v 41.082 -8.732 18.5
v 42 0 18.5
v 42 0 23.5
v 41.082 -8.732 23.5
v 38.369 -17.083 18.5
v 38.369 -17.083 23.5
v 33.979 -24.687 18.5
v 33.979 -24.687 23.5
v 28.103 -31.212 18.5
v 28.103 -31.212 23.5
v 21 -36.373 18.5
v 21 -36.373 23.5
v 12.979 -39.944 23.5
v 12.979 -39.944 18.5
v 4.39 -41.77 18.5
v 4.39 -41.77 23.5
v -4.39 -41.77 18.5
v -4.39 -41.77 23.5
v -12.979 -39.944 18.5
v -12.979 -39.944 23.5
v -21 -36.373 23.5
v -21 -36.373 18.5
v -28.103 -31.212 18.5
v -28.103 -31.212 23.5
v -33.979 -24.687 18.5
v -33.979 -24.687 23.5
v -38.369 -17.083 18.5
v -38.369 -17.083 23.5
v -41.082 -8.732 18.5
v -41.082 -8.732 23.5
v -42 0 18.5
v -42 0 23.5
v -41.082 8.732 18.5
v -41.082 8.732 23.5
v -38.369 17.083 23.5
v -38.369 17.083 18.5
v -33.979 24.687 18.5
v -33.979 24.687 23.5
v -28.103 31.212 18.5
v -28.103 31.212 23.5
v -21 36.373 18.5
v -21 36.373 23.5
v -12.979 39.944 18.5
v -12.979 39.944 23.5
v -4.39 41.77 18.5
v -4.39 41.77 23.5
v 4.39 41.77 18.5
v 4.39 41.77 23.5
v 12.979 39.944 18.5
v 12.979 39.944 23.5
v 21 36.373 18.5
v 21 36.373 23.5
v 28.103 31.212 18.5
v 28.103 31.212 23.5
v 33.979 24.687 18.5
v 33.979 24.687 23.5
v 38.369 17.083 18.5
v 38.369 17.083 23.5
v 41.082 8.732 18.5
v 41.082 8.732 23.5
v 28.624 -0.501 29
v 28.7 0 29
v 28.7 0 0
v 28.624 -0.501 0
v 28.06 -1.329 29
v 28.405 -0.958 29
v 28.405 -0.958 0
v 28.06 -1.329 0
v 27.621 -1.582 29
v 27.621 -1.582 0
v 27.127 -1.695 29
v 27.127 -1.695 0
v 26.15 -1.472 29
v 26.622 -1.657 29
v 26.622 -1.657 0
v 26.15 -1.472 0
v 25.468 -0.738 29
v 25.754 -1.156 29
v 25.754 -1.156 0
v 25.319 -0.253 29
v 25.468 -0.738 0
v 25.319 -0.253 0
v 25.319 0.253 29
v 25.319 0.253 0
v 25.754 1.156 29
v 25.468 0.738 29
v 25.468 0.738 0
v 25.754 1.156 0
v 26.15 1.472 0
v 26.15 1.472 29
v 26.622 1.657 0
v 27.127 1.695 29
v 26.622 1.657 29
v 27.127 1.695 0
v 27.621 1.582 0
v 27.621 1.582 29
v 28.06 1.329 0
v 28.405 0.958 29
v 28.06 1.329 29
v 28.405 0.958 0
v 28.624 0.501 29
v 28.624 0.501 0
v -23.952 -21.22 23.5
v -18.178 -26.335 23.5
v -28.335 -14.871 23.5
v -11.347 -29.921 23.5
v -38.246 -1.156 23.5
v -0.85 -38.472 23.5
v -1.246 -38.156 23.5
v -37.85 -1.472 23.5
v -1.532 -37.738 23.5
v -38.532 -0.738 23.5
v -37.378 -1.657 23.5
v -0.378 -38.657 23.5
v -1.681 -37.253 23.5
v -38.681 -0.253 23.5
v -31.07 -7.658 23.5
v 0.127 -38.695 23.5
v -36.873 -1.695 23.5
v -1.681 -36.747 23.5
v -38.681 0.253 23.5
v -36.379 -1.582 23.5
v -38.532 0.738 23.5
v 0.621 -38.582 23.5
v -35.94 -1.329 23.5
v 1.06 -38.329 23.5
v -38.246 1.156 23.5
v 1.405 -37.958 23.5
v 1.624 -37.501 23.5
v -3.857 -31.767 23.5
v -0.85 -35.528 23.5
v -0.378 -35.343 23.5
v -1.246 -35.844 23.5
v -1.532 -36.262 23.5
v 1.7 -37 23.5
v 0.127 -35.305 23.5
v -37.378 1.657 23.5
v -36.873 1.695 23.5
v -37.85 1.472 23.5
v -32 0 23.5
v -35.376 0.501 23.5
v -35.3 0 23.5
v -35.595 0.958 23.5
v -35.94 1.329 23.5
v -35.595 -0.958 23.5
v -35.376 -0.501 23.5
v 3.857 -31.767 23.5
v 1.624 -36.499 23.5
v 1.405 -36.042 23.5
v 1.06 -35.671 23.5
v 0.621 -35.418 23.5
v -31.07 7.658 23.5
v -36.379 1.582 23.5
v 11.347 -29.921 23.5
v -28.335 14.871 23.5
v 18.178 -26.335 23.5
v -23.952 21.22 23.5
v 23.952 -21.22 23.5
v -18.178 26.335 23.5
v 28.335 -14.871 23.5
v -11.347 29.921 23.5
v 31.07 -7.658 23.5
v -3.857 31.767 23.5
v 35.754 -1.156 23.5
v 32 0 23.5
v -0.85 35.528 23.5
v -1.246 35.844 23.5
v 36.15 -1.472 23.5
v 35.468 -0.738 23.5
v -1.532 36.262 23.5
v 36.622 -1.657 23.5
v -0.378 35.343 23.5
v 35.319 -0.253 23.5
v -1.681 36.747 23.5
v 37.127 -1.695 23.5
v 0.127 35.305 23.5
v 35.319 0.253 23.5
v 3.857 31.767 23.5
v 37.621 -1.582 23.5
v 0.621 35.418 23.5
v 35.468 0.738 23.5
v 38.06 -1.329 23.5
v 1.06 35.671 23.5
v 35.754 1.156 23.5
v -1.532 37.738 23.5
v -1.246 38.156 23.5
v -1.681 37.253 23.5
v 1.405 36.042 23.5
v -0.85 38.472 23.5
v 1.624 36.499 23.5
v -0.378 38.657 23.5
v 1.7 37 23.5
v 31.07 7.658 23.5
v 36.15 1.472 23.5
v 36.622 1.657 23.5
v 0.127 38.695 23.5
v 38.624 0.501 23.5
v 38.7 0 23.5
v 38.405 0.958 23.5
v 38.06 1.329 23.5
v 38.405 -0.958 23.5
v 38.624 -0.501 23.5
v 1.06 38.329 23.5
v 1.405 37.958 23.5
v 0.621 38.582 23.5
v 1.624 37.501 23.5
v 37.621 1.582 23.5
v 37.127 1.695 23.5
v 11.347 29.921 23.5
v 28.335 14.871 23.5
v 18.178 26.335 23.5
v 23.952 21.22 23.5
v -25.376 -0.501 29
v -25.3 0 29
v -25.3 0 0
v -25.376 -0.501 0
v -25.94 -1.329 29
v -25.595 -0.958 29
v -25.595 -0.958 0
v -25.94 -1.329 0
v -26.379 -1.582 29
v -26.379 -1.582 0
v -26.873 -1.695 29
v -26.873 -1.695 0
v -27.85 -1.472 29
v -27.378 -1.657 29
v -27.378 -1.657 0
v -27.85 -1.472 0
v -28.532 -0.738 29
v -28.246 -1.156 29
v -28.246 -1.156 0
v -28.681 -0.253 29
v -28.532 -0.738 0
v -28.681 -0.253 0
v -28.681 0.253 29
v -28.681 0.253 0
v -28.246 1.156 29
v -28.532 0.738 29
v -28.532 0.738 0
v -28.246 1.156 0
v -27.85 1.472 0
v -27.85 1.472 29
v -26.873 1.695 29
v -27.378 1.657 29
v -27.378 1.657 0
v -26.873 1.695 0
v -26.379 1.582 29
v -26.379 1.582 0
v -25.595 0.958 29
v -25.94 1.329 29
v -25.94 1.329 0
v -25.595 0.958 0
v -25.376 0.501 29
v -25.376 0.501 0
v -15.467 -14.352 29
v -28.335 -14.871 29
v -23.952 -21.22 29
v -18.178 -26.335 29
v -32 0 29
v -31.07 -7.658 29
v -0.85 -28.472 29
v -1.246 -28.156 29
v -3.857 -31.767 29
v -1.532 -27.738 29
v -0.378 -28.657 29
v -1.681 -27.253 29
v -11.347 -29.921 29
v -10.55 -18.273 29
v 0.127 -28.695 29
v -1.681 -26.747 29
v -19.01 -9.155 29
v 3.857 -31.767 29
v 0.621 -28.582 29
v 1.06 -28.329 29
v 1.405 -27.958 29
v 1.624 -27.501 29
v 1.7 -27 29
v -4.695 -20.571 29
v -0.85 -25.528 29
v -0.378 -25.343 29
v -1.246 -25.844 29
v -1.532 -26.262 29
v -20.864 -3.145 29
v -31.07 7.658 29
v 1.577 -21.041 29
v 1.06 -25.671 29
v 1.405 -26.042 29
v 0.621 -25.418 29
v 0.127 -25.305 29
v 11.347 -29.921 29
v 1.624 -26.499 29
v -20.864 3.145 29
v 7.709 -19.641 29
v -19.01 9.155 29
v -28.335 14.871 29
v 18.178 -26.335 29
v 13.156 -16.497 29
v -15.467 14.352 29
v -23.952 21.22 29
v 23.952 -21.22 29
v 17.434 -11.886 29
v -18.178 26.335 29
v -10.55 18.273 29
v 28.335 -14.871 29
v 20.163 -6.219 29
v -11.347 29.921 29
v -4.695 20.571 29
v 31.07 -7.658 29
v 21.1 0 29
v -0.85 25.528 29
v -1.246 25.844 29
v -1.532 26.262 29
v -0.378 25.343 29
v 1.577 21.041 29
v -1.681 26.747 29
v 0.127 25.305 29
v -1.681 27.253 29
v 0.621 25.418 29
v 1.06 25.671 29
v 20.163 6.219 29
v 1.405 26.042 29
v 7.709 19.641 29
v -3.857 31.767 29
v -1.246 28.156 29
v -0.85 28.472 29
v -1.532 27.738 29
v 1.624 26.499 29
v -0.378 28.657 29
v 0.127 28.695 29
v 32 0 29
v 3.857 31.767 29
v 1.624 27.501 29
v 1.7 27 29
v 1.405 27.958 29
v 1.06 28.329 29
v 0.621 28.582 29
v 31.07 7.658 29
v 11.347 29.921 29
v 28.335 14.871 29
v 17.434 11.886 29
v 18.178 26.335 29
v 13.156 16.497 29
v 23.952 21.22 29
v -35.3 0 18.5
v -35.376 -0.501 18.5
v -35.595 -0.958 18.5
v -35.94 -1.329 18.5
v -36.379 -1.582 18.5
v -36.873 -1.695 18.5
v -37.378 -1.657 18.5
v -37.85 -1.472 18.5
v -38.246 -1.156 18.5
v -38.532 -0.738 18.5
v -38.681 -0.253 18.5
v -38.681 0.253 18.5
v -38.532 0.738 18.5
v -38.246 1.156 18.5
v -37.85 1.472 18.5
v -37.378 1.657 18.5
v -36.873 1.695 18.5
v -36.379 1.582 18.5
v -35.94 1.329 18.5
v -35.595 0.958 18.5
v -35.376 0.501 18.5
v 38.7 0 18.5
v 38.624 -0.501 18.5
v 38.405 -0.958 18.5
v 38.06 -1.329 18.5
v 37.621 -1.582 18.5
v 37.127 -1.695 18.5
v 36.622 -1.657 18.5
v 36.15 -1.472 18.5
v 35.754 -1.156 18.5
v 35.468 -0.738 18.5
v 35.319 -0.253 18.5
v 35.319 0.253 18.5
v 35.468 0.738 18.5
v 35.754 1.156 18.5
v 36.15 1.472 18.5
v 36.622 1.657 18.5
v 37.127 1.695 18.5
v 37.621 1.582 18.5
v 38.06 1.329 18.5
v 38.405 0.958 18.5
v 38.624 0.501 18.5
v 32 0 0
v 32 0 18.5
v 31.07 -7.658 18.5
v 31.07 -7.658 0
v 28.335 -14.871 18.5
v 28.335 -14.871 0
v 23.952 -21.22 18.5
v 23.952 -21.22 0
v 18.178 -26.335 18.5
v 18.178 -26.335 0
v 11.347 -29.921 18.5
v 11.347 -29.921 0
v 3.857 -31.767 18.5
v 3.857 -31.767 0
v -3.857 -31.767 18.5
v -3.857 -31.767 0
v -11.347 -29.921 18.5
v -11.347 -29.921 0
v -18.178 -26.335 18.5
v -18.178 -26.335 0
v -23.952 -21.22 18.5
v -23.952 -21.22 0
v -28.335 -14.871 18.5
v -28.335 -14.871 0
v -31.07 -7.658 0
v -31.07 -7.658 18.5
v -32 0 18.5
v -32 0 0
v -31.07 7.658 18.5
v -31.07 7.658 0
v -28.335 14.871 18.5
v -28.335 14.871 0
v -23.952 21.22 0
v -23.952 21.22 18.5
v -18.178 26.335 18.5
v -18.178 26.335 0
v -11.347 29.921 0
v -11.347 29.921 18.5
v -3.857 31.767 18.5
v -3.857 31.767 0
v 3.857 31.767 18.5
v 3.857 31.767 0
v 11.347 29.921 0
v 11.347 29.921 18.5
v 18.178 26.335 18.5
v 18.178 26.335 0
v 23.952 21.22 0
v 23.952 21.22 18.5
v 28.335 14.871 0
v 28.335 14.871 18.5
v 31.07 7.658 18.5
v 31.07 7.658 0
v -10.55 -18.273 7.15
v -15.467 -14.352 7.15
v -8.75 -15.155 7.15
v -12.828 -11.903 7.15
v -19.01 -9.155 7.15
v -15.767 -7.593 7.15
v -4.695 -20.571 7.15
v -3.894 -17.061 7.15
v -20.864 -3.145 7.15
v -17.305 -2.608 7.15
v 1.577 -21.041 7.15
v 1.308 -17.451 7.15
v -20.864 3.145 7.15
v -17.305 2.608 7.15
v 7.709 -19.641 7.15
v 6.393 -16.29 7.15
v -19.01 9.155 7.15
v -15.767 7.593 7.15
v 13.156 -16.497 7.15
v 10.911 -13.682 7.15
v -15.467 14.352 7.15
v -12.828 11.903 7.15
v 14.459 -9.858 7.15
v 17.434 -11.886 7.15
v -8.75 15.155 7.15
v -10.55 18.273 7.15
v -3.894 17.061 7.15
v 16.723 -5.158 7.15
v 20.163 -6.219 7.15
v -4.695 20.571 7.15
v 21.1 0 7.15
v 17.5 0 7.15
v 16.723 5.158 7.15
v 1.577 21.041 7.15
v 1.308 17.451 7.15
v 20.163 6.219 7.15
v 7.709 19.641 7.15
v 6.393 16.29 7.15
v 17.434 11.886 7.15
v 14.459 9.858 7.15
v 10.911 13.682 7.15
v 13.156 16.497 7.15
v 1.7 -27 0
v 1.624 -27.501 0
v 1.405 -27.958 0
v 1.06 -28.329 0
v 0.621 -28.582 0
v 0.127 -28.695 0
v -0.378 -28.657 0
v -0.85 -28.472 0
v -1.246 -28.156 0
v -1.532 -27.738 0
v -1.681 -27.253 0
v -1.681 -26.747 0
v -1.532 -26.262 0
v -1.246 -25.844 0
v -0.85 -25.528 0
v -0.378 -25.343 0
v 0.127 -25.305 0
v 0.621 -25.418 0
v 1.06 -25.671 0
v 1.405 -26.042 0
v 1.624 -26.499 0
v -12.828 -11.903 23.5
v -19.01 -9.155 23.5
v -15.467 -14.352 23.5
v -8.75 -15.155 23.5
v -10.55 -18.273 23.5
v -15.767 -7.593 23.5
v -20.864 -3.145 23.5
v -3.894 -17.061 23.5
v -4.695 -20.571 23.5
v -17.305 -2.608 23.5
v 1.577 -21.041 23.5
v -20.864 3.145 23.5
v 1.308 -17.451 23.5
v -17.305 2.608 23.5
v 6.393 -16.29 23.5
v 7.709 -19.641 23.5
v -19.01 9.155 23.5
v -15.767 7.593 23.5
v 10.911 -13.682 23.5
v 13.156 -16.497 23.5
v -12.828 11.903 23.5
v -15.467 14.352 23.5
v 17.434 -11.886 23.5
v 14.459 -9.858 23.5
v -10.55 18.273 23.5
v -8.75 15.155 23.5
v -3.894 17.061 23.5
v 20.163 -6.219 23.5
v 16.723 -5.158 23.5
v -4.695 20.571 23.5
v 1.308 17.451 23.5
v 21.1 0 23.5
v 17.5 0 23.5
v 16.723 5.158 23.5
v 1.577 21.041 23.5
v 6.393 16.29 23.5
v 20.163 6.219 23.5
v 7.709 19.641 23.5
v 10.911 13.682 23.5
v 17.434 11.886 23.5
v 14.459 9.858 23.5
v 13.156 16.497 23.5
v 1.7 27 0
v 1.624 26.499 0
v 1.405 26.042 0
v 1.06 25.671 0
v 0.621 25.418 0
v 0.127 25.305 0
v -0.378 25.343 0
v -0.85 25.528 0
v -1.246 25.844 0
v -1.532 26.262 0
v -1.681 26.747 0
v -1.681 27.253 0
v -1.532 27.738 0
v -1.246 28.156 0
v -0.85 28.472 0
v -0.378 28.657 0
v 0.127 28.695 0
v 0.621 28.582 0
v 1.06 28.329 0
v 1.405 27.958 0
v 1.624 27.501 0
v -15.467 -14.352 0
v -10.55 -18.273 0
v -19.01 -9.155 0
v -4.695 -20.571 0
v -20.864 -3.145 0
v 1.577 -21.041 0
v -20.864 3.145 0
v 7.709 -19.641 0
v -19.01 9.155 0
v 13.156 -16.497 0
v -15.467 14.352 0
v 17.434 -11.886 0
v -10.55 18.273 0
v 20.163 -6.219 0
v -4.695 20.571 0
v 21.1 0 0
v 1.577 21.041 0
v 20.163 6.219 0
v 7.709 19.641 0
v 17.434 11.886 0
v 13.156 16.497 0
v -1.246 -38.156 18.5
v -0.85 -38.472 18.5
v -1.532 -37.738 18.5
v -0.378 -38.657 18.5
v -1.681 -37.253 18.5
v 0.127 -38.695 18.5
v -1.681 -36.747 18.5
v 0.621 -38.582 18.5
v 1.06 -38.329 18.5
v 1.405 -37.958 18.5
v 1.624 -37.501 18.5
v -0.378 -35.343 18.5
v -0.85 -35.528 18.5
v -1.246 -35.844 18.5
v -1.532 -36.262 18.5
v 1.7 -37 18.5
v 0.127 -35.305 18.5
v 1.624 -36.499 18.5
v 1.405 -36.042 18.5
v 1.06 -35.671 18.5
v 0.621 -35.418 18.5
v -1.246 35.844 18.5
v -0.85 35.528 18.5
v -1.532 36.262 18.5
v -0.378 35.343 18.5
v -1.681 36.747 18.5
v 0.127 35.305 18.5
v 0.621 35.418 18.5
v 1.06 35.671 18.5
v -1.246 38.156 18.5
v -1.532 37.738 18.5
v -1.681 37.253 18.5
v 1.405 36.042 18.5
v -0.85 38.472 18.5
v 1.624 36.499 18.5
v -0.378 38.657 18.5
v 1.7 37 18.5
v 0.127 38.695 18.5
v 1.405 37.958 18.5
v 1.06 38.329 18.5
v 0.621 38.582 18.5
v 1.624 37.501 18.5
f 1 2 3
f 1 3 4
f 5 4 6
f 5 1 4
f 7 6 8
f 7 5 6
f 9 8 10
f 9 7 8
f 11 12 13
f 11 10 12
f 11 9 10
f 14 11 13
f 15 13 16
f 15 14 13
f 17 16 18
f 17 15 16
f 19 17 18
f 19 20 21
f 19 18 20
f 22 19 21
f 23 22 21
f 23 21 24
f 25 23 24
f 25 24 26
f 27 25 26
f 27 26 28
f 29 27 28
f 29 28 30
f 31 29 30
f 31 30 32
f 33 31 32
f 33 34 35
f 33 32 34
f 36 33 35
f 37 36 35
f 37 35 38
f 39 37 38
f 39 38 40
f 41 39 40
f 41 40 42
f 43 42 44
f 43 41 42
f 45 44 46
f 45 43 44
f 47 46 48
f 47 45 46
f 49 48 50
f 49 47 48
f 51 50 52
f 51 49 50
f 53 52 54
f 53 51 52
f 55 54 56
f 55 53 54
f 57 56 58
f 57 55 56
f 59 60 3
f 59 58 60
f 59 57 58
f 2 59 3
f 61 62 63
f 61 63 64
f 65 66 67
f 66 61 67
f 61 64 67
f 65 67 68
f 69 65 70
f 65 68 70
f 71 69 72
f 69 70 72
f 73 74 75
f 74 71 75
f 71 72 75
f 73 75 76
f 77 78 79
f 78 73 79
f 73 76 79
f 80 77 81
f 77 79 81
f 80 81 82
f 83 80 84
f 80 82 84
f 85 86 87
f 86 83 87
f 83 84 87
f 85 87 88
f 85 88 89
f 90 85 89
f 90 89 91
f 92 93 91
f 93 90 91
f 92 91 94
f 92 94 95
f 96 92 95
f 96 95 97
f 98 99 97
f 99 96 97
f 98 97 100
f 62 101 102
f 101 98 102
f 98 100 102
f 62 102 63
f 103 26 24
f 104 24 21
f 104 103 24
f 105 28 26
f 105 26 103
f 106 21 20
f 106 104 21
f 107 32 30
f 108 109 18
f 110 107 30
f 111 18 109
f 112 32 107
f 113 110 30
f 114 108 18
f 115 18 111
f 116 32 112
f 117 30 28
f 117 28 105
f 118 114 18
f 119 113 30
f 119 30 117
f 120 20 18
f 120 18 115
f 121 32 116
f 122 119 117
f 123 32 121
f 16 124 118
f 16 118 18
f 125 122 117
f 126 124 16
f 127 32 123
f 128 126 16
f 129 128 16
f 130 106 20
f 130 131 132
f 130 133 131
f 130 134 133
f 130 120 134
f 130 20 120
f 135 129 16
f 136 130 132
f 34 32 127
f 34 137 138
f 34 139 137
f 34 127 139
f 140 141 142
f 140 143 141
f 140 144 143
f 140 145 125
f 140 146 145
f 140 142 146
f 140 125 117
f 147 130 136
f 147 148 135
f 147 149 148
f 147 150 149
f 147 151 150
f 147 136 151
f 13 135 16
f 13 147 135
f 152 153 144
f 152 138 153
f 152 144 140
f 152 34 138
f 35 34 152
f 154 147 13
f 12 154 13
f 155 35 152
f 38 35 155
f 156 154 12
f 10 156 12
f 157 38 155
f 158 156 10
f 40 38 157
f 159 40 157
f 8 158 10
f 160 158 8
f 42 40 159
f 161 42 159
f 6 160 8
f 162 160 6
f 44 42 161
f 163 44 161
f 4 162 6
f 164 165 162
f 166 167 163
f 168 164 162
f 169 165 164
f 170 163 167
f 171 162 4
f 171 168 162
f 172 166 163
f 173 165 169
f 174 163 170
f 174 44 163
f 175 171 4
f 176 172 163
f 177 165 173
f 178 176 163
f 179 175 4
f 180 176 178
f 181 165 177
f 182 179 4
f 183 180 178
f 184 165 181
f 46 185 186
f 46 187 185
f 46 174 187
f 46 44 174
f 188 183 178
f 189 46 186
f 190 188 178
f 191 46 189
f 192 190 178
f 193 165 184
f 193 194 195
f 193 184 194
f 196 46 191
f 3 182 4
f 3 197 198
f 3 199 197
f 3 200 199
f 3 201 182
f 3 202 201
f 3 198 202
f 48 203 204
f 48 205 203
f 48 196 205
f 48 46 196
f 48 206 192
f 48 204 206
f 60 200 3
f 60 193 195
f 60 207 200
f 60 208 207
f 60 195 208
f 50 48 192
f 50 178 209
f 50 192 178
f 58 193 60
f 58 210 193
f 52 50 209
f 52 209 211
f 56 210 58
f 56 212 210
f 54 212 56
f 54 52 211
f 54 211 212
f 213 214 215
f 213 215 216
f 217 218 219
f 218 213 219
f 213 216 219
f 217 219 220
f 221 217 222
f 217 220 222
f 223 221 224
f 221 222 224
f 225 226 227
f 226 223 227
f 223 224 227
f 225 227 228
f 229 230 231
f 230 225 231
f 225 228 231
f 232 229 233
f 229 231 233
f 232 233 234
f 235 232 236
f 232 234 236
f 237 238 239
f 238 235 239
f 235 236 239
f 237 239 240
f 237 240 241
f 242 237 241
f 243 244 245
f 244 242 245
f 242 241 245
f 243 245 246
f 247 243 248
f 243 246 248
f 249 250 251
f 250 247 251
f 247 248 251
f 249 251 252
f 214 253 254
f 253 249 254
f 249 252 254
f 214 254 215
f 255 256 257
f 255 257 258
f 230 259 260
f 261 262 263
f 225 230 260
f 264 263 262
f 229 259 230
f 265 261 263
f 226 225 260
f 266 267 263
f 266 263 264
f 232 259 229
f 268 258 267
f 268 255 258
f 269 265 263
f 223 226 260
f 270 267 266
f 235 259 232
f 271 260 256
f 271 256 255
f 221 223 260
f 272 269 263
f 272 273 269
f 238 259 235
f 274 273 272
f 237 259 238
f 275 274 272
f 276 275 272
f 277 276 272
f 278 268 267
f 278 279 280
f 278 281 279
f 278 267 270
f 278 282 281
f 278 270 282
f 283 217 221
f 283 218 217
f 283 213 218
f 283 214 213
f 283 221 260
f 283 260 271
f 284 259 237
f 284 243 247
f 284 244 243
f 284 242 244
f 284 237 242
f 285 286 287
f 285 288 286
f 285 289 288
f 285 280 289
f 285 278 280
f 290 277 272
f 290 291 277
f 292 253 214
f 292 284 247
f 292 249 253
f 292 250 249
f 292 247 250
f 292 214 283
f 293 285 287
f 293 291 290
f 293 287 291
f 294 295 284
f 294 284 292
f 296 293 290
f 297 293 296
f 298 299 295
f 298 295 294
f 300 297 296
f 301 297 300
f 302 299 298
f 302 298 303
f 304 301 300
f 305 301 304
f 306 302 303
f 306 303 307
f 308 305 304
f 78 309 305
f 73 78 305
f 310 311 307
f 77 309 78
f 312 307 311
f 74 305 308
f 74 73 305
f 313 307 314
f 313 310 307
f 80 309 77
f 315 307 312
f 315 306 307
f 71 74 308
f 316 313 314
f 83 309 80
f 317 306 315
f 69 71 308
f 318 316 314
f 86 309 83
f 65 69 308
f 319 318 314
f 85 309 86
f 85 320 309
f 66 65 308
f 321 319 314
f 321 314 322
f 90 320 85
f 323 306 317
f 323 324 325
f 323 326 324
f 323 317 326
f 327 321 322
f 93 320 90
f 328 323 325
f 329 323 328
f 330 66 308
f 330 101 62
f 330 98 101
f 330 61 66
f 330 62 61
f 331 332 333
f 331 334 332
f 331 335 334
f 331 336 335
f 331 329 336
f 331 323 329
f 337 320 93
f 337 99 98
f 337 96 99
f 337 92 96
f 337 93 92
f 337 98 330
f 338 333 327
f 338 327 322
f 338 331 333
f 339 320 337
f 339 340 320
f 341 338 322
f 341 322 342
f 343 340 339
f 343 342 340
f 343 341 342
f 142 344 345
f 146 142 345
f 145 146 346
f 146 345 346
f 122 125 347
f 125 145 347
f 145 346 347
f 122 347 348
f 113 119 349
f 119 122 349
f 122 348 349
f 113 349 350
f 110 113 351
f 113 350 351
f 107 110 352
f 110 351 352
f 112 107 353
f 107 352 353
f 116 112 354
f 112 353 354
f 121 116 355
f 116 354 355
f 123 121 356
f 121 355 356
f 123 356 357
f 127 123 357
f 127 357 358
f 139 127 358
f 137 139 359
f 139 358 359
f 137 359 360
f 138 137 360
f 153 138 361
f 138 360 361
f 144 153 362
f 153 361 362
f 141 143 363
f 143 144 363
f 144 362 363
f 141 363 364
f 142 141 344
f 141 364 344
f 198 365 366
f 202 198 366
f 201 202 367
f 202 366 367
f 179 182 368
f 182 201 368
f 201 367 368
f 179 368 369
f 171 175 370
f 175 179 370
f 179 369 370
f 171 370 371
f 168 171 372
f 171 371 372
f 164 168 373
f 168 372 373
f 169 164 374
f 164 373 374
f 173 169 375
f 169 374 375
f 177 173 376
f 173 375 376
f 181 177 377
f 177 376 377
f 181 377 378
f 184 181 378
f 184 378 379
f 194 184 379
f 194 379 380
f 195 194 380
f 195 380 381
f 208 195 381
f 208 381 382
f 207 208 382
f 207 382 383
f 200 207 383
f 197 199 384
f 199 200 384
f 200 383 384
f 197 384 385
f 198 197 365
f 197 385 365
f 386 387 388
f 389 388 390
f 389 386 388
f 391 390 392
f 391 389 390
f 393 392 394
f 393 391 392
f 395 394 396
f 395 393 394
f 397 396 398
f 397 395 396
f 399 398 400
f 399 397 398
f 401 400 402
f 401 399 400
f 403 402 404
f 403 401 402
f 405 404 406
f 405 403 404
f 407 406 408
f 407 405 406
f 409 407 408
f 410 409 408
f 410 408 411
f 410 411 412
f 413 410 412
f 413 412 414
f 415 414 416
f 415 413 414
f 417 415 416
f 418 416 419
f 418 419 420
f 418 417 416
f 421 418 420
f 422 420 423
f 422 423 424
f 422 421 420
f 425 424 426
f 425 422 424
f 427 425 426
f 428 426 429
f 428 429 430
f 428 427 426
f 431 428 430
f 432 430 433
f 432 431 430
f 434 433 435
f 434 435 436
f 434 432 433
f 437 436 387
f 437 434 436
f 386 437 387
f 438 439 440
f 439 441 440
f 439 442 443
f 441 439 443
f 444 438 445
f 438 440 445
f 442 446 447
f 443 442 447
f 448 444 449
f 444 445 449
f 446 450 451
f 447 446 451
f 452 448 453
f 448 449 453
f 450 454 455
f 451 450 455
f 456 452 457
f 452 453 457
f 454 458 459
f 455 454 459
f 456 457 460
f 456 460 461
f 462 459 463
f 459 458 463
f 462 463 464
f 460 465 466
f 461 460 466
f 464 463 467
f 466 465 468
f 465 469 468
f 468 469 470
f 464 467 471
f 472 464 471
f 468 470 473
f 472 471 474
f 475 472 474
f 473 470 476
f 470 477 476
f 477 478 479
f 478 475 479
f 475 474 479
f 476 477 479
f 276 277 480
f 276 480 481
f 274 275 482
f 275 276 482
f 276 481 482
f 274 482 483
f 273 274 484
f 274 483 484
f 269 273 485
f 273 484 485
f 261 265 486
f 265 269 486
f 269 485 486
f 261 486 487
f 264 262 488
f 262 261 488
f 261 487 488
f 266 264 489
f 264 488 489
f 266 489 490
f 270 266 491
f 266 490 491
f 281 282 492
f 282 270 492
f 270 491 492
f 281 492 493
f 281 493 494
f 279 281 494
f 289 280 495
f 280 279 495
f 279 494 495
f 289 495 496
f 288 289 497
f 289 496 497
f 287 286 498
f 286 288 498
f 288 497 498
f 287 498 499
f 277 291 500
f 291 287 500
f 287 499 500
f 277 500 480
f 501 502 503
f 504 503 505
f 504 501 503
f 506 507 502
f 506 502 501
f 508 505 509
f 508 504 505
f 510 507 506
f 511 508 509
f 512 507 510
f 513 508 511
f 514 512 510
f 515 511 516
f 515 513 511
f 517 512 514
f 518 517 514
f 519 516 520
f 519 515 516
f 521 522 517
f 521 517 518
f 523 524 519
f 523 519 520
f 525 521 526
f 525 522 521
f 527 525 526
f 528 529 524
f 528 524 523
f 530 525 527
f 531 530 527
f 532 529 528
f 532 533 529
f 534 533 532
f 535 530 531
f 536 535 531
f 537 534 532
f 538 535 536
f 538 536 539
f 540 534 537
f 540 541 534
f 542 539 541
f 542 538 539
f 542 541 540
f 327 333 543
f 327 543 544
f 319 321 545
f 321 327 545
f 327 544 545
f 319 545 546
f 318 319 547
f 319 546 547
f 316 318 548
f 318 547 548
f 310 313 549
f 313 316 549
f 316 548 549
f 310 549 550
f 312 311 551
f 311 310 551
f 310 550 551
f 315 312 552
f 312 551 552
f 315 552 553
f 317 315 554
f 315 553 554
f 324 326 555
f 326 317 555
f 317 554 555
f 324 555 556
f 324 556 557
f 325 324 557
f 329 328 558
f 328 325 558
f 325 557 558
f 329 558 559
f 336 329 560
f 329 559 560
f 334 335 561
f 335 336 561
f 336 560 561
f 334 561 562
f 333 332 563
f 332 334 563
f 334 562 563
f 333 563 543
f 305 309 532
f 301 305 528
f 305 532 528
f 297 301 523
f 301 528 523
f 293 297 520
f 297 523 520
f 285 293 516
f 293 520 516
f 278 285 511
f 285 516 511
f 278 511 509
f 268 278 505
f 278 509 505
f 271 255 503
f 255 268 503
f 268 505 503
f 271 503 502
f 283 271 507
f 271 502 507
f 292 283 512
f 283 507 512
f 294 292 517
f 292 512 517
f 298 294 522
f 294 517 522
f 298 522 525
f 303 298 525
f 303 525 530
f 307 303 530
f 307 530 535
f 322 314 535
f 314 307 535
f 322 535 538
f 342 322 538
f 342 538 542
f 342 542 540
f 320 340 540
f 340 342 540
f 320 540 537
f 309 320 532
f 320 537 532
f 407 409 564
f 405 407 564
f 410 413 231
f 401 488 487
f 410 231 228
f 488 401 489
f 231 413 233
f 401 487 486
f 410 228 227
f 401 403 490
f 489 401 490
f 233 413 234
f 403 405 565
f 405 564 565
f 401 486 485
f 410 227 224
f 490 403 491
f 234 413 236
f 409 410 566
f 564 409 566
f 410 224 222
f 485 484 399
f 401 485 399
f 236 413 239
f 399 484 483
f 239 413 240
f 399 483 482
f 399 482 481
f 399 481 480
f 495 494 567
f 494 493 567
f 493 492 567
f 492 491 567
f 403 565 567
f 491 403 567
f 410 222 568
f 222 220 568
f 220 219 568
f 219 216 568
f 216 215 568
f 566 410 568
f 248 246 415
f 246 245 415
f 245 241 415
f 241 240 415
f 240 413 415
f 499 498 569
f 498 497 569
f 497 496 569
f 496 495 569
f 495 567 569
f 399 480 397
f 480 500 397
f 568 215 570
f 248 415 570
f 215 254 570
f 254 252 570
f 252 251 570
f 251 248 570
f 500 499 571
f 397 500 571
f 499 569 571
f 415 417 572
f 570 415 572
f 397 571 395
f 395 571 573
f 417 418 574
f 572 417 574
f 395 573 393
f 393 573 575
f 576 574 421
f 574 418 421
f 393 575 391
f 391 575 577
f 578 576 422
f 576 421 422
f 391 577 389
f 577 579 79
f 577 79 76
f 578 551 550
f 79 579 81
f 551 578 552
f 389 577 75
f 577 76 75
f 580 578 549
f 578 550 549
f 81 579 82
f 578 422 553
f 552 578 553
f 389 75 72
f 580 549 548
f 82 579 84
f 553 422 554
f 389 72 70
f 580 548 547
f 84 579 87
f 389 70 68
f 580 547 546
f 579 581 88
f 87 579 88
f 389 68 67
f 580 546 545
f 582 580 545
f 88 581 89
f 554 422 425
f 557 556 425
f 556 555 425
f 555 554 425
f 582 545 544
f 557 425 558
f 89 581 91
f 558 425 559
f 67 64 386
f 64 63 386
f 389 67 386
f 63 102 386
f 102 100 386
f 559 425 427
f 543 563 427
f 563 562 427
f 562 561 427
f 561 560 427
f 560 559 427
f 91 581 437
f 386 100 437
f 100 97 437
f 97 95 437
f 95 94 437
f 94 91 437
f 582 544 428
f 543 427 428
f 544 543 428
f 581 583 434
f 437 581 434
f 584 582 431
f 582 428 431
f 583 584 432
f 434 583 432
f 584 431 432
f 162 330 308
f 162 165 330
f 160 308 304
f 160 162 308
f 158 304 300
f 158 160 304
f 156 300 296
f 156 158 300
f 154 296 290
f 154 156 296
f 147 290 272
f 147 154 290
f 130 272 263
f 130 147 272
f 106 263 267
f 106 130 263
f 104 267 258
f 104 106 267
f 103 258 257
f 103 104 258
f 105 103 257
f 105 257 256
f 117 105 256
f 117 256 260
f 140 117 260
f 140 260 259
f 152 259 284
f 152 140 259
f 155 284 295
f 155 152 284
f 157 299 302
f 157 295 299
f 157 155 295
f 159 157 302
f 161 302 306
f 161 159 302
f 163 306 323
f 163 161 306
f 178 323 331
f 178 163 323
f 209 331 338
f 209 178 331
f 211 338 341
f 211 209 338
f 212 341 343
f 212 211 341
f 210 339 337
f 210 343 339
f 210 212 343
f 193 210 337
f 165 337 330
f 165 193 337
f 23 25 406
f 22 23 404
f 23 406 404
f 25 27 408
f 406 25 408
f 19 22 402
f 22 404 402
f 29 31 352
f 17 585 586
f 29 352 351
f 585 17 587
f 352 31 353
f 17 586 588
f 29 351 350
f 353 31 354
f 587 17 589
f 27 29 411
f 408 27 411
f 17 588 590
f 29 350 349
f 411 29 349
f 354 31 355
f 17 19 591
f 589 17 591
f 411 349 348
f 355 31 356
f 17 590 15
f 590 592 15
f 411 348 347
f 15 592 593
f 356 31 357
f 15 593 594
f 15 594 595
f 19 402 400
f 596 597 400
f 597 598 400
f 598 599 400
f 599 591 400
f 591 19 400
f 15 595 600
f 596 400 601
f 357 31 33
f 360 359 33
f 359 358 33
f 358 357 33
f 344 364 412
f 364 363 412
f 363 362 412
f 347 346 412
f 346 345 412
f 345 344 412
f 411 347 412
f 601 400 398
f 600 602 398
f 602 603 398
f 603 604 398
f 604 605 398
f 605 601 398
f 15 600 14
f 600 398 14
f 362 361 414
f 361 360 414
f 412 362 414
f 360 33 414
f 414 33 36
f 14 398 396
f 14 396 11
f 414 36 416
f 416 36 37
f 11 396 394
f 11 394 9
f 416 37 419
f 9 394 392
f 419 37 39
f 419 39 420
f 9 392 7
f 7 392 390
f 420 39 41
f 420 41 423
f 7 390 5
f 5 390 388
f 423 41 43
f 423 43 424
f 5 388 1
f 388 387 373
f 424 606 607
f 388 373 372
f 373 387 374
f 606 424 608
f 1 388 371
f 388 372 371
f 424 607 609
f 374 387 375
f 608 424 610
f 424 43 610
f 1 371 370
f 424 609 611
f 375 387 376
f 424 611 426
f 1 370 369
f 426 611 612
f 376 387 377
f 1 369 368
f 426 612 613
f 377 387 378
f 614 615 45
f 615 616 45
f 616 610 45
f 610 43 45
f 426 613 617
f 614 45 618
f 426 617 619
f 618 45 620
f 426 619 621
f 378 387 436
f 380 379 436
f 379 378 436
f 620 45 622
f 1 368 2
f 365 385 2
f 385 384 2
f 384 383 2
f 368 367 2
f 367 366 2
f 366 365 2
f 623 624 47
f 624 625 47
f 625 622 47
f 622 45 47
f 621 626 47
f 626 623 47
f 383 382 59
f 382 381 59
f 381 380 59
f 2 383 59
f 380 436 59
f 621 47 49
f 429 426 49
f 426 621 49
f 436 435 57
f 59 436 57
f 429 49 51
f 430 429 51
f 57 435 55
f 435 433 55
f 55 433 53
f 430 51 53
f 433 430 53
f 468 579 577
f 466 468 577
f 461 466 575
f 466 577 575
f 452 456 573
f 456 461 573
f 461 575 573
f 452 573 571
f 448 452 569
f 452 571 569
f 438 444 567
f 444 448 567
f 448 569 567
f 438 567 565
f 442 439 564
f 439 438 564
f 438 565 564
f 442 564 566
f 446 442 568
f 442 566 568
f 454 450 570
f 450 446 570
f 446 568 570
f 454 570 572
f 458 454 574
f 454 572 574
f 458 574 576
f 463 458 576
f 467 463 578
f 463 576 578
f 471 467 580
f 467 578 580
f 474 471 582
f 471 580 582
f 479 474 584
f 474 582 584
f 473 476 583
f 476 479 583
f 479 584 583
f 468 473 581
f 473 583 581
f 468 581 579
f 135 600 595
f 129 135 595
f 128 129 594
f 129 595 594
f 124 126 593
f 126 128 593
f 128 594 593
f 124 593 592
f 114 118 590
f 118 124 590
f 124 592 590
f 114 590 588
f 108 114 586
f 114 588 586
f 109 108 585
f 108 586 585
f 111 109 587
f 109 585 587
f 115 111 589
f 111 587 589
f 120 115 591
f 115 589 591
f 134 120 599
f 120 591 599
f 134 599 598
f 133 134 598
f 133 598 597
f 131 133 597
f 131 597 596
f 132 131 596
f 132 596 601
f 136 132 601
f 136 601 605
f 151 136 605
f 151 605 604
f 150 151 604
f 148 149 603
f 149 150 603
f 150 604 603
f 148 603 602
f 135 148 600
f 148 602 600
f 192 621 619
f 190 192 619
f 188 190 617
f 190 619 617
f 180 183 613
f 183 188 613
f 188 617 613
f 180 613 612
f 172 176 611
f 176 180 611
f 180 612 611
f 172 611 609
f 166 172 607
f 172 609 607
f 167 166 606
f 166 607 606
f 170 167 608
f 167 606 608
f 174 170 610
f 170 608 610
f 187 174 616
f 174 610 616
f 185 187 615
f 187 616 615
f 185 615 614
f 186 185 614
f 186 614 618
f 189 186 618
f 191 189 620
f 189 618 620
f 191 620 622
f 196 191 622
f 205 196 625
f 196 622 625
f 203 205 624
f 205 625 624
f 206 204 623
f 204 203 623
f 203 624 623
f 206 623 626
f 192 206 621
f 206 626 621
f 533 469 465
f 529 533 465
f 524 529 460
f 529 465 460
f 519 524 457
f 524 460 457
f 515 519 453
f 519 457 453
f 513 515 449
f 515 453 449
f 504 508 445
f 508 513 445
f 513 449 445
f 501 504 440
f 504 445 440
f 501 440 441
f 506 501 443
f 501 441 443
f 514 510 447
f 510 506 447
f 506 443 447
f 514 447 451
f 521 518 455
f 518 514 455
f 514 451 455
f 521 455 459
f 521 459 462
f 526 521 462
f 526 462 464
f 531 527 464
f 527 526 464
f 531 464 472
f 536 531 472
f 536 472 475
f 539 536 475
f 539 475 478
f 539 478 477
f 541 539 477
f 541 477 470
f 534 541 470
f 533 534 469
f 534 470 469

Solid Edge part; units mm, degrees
sketch "Sketch1" plane through (0, 0, 0) normal (0, 0, 1) x (1, 0, 0)
  circle A0 centre (0, 0) radius 32
  circle A1 centre (0, 0) radius 21.1
  circle A2 centre (27, 0) radius 1.7
  circle A3 centre (0, 27) radius 1.7
  circle A4 centre (-27, 0) radius 1.7
  circle A5 centre (0, -27) radius 1.7
extrude "Protrusion1" add sketch "Sketch1" along normal blind 7.15
sketch "Sketch2" plane through (0, 0, 7.15) normal (0, 0, 1) x (1, 0, 0)
  circle A0 centre (0, 0) radius 32
  circle A1 centre (0, 0) radius 17.5
  circle A2 centre (27, 0) radius 1.7
  circle A3 centre (0, 27) radius 1.7
  circle A4 centre (-27, 0) radius 1.7
  circle A5 centre (0, -27) radius 1.7
extrude "ExtrudedProtrusion_2" add sketch "Sketch2" along normal blind 14.7
sketch "Sketch3" plane through (0, 0, 21.85) normal (0, 0, 1) x (1, 0, 0)
  circle A0 centre (0, 0) radius 32
  circle A1 centre (0, 0) radius 21.1
  circle A2 centre (27, 0) radius 1.7
  circle A3 centre (0, 27) radius 1.7
  circle A4 centre (-27, 0) radius 1.7
  circle A5 centre (0, -27) radius 1.7
extrude "ExtrudedProtrusion_3" add sketch "Sketch3" along normal blind 7.15
sketch "Sketch4" plane through (0, 0, 18.5) normal (0, 0, 1) x (1, 0, 0)
  circle A0 centre (0, 0) radius 42
  circle A1 centre (0, 0) radius 17.5
  circle A2 centre (27, 0) radius 1.7
  circle A3 centre (0, 27) radius 1.7
  circle A4 centre (-27, 0) radius 1.7
  circle A5 centre (0, -27) radius 1.7
  circle A6 centre (37, 0) radius 1.7
  circle A7 centre (0, 37) radius 1.7
  circle A8 centre (-37, 0) radius 1.7
  circle A9 centre (0, -37) radius 1.7
extrude "ExtrudedProtrusion_4" add sketch "Sketch4" along normal blind 5
